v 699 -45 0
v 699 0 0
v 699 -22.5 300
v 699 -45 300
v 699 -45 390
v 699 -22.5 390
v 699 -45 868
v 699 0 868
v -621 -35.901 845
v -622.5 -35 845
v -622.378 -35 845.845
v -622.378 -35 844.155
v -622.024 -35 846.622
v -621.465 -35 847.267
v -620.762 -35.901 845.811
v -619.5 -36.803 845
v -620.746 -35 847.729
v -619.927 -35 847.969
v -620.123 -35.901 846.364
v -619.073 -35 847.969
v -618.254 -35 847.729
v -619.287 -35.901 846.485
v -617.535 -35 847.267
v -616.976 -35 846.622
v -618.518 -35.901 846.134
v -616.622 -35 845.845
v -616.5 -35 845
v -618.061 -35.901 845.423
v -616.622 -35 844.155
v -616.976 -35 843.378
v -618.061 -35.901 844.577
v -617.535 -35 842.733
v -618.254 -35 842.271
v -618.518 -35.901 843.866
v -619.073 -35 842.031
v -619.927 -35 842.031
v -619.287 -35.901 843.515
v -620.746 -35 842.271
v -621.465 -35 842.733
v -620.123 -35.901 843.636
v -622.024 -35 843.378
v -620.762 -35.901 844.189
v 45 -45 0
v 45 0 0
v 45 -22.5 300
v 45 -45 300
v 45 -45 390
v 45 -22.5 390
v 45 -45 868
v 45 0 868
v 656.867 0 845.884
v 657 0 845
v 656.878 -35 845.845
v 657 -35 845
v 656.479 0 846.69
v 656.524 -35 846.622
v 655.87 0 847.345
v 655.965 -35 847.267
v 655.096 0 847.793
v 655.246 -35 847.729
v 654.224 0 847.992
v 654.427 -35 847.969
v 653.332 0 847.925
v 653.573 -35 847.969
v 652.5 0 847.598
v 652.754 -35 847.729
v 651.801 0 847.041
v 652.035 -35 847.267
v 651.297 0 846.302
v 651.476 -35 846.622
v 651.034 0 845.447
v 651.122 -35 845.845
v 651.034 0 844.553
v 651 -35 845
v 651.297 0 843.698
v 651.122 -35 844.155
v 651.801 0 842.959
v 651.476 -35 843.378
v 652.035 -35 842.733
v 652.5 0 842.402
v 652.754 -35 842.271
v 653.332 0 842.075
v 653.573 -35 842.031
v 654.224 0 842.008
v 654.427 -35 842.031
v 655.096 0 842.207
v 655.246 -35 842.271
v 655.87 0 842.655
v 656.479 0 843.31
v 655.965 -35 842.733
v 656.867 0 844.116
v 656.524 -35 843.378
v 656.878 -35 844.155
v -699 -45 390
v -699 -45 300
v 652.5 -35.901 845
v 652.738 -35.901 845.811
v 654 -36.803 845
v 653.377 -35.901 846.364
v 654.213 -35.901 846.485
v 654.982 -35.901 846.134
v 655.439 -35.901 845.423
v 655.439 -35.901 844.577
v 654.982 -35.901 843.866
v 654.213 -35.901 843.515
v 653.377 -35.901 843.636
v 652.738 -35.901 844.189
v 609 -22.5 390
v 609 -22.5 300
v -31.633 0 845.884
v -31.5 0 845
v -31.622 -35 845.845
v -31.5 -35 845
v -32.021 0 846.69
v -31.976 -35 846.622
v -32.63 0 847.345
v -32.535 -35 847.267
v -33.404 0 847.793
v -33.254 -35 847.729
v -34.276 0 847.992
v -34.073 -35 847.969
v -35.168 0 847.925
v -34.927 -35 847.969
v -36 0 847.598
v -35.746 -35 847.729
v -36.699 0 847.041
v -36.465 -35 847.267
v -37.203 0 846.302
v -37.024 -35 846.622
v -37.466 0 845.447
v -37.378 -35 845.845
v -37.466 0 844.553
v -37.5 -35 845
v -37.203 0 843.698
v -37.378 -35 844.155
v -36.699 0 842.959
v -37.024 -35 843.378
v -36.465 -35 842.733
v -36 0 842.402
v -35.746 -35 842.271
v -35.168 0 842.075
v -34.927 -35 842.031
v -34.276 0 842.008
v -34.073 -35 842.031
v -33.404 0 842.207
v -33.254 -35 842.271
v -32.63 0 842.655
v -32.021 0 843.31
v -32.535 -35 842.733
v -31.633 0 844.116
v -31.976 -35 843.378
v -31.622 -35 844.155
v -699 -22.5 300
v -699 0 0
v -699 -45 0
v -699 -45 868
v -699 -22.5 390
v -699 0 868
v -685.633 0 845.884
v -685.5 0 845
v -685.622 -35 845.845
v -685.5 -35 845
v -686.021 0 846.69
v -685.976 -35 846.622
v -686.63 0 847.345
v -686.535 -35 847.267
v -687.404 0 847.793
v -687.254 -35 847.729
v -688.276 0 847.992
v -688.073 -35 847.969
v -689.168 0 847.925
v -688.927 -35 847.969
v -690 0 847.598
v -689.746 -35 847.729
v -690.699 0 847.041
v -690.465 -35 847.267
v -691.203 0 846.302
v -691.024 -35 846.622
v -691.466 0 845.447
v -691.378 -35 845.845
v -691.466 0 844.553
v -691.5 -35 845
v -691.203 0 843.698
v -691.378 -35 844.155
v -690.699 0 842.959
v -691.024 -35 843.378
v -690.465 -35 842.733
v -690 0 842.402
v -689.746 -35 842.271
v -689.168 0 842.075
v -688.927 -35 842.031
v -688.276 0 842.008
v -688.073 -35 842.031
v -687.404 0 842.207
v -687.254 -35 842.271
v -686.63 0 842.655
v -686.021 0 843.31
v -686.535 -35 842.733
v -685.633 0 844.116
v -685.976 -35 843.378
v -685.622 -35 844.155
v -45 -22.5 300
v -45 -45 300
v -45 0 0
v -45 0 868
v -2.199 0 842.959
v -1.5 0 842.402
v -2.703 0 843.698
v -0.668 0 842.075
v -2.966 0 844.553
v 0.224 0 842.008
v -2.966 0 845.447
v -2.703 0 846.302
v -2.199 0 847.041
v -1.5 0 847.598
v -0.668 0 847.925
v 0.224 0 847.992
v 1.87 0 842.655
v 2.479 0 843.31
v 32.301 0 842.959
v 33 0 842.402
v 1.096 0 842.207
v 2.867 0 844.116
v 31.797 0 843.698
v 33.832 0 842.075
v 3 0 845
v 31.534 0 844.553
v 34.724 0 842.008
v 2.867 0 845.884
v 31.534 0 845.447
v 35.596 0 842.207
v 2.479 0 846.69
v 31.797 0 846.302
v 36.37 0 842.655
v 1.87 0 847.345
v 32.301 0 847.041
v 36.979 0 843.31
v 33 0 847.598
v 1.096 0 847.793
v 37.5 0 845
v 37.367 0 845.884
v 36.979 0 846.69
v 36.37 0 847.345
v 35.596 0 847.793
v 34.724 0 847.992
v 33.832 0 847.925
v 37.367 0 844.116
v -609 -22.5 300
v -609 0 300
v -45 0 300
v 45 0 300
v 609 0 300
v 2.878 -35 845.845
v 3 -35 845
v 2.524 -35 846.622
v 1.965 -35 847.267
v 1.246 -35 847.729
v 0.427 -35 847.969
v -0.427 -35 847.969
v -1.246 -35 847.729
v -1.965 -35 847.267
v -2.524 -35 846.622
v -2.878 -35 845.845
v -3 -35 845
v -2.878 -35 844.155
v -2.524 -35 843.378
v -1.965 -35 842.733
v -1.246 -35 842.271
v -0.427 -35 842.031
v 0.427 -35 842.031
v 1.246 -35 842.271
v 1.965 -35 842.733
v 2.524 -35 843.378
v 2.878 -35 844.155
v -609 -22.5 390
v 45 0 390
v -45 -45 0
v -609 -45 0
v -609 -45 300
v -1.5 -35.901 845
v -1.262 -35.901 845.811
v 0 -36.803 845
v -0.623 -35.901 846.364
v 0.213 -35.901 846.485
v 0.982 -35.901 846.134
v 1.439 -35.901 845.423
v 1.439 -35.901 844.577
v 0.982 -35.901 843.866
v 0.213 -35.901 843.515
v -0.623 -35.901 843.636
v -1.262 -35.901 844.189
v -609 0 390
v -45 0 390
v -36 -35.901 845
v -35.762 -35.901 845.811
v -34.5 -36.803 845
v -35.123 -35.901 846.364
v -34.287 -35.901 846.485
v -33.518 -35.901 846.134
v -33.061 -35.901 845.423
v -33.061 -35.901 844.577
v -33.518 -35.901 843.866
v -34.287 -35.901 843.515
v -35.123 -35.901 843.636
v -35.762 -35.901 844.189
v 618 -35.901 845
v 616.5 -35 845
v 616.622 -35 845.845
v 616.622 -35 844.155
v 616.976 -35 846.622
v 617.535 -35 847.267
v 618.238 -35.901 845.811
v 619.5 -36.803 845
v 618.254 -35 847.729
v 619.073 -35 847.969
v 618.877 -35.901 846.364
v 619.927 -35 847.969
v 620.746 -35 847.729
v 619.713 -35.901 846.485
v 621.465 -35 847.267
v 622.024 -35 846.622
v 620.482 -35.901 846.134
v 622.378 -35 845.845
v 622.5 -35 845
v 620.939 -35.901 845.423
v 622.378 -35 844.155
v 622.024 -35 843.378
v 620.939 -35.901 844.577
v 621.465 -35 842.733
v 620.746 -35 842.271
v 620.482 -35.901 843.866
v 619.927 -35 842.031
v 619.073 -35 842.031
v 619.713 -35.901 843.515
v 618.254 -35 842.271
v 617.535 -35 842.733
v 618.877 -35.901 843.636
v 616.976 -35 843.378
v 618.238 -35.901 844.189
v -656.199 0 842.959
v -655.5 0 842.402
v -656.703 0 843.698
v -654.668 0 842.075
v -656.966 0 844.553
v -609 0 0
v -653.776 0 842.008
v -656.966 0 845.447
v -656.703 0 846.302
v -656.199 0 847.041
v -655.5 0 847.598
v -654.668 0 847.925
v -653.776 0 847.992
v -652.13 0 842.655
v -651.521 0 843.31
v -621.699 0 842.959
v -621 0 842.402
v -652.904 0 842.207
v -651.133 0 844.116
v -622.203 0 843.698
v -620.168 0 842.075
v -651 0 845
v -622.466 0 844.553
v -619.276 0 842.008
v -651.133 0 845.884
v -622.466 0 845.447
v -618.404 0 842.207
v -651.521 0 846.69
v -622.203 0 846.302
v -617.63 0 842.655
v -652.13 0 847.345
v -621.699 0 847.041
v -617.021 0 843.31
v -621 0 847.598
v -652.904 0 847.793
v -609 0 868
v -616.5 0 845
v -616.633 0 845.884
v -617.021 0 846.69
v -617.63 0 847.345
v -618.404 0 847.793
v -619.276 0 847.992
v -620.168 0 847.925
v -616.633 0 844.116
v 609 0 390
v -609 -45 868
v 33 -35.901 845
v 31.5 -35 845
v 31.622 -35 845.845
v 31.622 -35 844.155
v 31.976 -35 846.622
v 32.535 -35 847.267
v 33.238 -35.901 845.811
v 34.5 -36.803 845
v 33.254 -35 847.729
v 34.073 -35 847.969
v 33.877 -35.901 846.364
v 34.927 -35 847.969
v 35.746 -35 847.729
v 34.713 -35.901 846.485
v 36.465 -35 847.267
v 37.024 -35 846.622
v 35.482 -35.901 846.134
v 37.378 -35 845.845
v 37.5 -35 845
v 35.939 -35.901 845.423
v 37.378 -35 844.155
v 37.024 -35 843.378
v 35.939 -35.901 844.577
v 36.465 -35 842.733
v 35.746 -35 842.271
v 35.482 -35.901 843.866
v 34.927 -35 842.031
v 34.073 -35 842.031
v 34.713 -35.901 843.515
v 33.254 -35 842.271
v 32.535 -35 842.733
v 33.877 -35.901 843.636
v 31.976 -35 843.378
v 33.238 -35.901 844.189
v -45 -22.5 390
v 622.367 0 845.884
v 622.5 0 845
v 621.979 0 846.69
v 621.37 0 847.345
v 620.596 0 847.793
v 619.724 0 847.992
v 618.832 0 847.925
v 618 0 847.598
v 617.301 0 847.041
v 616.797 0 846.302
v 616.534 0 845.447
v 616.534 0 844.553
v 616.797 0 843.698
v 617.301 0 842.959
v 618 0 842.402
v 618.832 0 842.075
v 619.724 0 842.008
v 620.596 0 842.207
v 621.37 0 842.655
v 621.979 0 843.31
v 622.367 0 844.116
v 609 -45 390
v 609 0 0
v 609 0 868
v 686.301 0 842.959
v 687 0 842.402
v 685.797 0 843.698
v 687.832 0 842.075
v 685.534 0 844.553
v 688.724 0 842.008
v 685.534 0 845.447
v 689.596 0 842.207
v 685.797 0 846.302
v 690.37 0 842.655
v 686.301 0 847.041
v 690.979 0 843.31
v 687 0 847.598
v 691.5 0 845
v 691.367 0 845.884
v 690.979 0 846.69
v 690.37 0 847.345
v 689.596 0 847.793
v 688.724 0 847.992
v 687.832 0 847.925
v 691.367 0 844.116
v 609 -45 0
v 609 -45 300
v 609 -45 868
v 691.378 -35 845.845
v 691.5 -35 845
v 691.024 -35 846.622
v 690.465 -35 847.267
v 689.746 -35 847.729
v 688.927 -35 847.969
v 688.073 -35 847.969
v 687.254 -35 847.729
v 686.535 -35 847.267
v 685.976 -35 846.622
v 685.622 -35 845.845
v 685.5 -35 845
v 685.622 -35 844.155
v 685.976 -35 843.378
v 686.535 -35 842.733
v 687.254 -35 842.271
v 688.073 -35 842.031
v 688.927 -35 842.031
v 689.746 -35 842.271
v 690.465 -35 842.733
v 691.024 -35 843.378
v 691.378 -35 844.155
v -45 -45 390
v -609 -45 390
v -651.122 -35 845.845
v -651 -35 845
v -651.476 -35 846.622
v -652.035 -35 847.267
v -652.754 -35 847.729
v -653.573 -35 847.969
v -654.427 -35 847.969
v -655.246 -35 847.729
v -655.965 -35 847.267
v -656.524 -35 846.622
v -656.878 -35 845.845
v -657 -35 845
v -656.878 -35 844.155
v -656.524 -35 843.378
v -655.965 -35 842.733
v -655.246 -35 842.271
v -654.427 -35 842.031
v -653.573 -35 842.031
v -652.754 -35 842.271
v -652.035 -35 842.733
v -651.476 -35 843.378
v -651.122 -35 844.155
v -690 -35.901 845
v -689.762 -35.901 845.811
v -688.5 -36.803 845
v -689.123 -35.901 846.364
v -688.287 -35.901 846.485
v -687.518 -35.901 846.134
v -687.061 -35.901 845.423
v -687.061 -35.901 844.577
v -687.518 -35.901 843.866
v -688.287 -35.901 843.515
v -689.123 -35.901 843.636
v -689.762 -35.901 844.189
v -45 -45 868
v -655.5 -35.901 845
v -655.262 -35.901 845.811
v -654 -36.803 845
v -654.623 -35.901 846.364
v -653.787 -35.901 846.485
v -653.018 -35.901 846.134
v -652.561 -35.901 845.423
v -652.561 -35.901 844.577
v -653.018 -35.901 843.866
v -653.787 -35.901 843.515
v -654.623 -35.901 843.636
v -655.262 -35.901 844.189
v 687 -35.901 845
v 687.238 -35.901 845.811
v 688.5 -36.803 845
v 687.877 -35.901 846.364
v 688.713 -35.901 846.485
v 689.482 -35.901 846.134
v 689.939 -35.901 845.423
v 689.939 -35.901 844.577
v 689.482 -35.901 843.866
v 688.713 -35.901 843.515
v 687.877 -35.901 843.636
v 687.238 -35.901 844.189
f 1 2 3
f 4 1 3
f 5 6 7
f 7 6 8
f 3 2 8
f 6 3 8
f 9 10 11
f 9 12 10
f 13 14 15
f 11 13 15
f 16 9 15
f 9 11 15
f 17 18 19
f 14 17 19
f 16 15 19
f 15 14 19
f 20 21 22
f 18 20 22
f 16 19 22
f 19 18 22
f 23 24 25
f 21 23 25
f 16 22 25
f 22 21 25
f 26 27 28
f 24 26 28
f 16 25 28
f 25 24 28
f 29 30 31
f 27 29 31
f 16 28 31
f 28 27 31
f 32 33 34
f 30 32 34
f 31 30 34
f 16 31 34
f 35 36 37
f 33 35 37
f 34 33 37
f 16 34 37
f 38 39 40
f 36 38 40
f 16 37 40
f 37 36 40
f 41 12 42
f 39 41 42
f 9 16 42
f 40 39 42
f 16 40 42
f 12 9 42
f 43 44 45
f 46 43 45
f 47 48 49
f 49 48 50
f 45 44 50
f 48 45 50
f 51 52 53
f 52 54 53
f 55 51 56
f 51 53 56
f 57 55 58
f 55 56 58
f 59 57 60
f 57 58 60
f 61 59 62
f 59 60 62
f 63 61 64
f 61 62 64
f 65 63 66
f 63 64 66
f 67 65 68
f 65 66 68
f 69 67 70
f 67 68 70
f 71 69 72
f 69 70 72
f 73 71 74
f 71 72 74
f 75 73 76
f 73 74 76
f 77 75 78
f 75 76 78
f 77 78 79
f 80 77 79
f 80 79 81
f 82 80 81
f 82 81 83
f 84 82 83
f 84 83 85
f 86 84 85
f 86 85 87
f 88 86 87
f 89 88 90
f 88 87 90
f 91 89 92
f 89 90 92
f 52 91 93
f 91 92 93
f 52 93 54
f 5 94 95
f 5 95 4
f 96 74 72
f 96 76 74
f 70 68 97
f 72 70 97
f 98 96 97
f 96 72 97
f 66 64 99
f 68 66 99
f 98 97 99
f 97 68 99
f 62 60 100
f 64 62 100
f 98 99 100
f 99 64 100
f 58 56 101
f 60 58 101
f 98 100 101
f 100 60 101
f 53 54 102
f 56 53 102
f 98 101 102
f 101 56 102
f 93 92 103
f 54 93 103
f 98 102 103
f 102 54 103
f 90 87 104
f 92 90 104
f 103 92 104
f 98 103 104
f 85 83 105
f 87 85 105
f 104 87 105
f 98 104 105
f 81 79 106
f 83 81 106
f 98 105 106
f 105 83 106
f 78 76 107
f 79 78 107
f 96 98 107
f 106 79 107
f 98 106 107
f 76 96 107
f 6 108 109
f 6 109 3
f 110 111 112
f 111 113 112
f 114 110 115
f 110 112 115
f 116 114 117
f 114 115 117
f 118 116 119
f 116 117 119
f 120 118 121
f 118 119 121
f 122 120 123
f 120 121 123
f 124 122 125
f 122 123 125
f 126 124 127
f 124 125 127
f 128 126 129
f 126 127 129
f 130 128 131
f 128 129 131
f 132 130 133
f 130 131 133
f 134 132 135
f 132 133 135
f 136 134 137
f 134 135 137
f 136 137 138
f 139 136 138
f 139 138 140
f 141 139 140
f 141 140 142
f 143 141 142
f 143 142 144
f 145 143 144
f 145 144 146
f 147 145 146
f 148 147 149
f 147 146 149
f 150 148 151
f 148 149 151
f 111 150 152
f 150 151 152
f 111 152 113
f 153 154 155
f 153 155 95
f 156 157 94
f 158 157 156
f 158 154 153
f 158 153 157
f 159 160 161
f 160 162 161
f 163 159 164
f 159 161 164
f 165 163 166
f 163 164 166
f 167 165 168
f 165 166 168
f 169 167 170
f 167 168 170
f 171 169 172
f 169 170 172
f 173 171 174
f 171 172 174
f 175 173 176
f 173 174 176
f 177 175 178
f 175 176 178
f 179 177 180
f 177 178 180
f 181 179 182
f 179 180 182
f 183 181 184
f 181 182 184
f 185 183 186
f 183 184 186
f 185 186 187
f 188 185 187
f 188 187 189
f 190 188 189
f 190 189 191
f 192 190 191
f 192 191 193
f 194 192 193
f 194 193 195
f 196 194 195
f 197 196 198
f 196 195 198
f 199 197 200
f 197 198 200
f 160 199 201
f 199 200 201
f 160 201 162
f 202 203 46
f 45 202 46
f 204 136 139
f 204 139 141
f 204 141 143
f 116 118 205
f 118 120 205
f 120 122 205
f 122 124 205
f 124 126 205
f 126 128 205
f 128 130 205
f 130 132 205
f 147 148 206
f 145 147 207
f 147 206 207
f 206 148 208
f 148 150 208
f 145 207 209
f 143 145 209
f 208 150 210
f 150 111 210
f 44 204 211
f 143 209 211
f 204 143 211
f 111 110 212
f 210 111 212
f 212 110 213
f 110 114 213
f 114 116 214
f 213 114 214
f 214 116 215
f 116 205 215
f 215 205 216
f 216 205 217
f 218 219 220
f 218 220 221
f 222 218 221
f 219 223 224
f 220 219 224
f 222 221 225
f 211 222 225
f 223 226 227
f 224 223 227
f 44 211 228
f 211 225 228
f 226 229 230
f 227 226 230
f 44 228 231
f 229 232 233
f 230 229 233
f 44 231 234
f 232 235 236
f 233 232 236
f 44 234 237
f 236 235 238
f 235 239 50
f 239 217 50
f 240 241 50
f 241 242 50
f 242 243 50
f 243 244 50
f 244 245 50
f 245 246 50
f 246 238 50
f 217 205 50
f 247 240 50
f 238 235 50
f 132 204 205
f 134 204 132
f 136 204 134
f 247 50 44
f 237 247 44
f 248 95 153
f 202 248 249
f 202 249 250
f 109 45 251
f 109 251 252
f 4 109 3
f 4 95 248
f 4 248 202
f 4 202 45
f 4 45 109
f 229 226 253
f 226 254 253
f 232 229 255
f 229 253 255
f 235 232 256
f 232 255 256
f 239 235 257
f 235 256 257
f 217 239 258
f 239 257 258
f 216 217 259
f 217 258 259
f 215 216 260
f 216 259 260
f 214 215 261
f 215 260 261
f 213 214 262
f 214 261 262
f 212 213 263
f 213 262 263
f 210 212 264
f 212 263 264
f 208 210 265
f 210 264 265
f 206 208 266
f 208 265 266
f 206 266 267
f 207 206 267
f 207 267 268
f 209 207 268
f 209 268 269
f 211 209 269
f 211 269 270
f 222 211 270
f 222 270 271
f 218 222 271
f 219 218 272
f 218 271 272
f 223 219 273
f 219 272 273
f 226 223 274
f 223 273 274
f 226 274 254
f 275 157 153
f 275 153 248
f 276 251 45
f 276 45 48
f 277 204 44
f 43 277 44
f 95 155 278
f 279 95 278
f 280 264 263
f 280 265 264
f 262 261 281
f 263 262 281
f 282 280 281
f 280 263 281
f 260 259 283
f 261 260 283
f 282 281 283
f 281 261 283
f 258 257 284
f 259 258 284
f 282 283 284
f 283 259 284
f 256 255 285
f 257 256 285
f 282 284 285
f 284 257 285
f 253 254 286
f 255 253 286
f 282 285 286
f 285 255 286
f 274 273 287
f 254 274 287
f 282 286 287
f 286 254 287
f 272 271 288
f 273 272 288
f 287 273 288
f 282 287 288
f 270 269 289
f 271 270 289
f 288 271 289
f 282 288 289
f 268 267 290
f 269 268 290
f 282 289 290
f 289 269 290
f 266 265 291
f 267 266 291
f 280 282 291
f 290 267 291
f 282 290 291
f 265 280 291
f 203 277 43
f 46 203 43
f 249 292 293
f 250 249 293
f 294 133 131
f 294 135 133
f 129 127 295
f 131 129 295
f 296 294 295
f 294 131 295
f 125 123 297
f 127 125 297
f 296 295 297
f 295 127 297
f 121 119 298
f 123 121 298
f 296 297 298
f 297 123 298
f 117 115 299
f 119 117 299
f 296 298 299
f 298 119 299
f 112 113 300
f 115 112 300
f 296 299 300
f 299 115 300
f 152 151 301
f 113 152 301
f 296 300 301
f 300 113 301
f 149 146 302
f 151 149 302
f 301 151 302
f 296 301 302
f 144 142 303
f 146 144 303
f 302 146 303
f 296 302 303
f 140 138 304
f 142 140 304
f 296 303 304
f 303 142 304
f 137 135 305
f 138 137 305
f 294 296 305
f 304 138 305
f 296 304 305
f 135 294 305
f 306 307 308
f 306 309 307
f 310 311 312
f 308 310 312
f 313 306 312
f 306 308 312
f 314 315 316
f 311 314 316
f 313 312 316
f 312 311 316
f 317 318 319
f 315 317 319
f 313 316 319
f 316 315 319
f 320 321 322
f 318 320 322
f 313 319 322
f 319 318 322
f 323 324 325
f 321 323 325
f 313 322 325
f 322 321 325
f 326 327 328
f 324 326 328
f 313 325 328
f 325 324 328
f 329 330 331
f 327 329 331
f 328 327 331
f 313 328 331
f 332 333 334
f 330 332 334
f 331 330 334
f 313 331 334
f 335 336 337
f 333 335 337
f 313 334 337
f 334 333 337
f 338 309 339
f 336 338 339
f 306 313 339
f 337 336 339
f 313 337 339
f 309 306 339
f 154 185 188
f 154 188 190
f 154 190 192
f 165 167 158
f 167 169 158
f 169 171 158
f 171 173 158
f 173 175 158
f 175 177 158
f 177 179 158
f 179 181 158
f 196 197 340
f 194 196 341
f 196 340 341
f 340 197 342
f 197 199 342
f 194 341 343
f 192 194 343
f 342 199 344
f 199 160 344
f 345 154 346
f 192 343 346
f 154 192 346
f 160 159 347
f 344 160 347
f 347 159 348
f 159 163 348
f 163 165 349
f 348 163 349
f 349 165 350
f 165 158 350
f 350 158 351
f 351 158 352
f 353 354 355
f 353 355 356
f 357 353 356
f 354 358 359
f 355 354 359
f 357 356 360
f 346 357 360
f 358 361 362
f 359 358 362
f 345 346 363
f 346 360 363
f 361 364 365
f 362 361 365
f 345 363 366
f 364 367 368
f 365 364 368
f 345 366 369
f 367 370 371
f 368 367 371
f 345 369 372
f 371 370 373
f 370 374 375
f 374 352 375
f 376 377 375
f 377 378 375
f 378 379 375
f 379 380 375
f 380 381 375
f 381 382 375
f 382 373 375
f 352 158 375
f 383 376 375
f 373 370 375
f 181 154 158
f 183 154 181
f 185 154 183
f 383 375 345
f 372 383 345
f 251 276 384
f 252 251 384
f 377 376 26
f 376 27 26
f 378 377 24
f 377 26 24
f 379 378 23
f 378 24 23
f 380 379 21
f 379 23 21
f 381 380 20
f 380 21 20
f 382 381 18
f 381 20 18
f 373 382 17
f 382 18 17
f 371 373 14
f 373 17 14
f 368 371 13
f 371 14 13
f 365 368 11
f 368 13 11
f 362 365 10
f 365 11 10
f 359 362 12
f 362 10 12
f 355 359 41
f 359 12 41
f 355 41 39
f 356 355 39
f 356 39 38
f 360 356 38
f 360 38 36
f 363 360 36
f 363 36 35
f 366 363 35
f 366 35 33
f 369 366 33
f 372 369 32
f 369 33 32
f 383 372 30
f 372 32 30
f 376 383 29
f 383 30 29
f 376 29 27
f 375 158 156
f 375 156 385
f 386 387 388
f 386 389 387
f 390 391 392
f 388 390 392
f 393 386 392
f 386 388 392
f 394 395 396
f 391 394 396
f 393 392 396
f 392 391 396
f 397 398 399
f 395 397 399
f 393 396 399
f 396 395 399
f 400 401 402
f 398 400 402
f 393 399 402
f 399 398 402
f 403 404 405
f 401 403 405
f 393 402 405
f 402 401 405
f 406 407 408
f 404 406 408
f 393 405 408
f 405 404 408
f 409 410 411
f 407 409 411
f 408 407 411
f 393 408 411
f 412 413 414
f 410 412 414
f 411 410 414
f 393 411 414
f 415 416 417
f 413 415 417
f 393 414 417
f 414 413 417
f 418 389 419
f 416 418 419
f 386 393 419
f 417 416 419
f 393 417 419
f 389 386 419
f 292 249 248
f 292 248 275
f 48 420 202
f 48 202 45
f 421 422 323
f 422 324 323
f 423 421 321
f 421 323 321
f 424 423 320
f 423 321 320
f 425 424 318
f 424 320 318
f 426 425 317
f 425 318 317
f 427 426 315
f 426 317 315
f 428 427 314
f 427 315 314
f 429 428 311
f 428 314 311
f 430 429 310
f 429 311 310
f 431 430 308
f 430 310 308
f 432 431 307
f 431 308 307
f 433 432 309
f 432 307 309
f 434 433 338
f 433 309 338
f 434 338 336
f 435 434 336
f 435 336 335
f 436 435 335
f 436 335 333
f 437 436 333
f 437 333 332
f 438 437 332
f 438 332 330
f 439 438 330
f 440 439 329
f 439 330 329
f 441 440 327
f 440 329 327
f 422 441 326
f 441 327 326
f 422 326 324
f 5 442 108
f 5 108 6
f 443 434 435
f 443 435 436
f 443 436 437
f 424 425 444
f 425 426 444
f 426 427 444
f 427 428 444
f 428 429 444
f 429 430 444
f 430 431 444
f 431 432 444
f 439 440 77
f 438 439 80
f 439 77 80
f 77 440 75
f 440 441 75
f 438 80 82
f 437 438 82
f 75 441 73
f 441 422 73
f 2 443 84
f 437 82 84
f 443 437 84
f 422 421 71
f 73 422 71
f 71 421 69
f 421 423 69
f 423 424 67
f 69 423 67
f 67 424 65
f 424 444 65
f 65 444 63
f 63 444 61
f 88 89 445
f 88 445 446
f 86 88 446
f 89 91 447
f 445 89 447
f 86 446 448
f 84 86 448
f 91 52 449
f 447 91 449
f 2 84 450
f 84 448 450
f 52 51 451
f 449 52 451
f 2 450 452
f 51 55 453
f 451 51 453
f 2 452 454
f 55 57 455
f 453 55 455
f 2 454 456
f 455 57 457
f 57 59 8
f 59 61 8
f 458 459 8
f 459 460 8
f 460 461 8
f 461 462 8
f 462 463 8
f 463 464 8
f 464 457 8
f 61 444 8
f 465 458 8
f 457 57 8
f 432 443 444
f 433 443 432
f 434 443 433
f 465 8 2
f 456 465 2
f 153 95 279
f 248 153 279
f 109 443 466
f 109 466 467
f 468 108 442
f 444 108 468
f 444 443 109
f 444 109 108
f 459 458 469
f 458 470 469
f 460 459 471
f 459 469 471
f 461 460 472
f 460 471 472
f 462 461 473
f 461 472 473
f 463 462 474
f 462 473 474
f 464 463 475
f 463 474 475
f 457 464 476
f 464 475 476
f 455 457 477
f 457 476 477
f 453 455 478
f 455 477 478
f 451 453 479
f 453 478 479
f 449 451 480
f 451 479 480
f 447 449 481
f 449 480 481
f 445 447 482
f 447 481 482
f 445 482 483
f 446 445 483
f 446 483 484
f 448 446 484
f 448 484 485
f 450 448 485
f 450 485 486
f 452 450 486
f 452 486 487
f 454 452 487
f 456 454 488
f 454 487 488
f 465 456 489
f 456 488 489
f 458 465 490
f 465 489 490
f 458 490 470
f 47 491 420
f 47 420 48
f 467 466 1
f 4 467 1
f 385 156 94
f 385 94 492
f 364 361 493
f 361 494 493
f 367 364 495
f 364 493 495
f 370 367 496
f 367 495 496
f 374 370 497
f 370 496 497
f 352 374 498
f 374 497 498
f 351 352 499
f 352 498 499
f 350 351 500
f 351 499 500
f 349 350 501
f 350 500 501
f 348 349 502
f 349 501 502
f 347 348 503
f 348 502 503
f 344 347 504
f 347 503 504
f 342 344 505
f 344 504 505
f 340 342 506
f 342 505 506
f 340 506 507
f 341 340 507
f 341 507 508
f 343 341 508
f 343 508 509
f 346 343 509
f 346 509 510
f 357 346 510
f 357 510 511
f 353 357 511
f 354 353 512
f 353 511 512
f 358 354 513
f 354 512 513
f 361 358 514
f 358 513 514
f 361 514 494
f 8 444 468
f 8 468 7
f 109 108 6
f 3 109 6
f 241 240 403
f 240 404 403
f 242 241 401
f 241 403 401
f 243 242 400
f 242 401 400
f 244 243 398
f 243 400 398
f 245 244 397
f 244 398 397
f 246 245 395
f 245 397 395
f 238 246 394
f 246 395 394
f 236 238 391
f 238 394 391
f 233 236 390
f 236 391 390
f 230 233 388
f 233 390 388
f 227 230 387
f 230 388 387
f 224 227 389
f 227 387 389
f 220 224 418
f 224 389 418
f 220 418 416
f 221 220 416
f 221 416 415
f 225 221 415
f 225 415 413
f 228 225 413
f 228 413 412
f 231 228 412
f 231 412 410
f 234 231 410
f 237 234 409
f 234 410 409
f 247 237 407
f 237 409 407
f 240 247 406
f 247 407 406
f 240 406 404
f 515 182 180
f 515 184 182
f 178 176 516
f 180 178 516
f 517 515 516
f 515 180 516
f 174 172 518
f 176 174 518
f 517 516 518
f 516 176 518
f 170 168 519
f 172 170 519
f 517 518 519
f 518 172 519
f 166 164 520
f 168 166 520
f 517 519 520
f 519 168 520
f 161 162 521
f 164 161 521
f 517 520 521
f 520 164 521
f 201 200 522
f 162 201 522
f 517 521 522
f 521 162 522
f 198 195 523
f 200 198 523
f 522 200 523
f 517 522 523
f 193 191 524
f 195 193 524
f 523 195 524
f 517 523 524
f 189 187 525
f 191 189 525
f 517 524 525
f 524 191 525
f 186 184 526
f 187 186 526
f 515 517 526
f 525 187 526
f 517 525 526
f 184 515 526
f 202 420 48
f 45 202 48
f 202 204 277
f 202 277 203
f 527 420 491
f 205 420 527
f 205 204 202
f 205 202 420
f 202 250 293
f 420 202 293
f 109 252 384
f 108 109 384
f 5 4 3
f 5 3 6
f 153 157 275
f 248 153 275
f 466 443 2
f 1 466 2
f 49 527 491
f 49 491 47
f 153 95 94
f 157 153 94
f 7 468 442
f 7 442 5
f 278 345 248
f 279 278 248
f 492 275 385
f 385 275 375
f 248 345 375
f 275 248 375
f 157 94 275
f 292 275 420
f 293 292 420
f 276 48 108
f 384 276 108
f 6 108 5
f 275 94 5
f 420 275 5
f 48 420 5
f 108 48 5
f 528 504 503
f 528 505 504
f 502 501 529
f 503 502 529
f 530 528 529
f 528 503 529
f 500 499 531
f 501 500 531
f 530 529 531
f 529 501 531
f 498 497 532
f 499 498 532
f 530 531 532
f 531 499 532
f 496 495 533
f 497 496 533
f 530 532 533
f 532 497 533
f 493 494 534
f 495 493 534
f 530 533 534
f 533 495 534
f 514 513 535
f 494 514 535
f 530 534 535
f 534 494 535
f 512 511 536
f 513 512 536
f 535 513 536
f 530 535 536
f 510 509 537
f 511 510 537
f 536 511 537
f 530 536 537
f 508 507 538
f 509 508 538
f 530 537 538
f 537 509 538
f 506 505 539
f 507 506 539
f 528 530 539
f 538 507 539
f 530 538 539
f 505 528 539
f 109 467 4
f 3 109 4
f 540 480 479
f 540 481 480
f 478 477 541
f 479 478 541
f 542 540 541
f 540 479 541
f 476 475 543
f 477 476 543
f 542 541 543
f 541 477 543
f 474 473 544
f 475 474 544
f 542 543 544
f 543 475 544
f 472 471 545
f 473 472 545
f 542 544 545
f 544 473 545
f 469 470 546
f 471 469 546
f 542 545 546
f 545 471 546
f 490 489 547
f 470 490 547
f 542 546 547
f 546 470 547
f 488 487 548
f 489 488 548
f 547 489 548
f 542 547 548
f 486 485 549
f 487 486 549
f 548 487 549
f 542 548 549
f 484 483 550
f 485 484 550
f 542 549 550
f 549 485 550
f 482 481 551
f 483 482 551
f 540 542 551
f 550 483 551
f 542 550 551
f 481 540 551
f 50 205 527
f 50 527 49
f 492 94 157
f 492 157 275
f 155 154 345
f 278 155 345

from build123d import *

# Parameters (mm, degrees)
F0_W       = 90
F0_H       = 868
F1_DEPTH   = 45
F2_W       = 1398
F2_H       = 90
F3_DEPTH   = 22.5
F4_W       = 1398
F4_H       = 90
F5_DEPTH   = 45
F8_D       = 6
F8_DEPTH   = 35
F8_TIP     = 1.8025818571
F8_2_D     = 6
F8_2_DEPTH = 35
F8_2_TIP   = 1.8025818571
F8_3_D     = 6
F8_3_DEPTH = 35
F8_3_TIP   = 1.8025818571


with BuildPart() as f1:
    # F0 (on Front) → F1 (new body)
    with BuildSketch(Plane.XZ):
        with Locations((-654, 434)):
            Rectangle(F0_W, F0_H)
    extrude(amount=F1_DEPTH)


with BuildPart() as f1b:
    # F0 (on Front) → F1, piece 2 (new body)
    with BuildSketch(Plane.XZ):
        with Locations((0, 434)):
            Rectangle(F0_W, F0_H)
    extrude(amount=F1_DEPTH)


with BuildPart() as f1c:
    # F0 (on Front) → F1, piece 3 (new body)
    with BuildSketch(Plane.XZ):
        with Locations((654, 434)):
            Rectangle(F0_W, F0_H)
    extrude(amount=F1_DEPTH)


with BuildPart() as f3_tool:
    # F2 (on face) → F3 (new body)
    with BuildSketch(Plane.XZ.offset(45)):
        with Locations((0, 345)):
            Rectangle(F2_W, F2_H)
    extrude(amount=-F3_DEPTH)


with BuildPart() as f1_1:
    add(f1.part)

    # F3: cut by f3_tool
    add(f3_tool.part, mode=Mode.SUBTRACT)


with BuildPart() as f1b_1:
    add(f1b.part)

    # F3: cut by f3_tool
    add(f3_tool.part, mode=Mode.SUBTRACT)


with BuildPart() as f1c_1:
    add(f1c.part)

    # F3: cut by f3_tool
    add(f3_tool.part, mode=Mode.SUBTRACT)


with BuildPart() as f5:
    # F4 (on face) → F5 (new body)
    with BuildSketch(Plane.XZ.offset(45)):
        with Locations((0, 345)):
            Rectangle(F4_W, F4_H)
    extrude(amount=-F5_DEPTH)

    # F6: cut F1, F1b, F1c
    add(f1_1.part, mode=Mode.SUBTRACT)
    add(f1b_1.part, mode=Mode.SUBTRACT)
    add(f1c_1.part, mode=Mode.SUBTRACT)


with BuildPart() as f1_2:
    add(f1_1.part)

    # F8
    with Locations(Plane(origin=(0, 0, 0), x_dir=(-1, 0, 0), z_dir=(0, 1, 0))):
        with Locations((-688.5, 845), (-654, 845), (-619.5, 845), (-34.5, 845), (0, 845), (34.5, 845), (619.5, 845), (654, 845), (688.5, 845)):
            Hole(F8_D / 2, depth=F8_DEPTH)
            with Locations((0, 0, -(F8_DEPTH + F8_TIP / 2))):  # 118° drill point
                Cone(0, F8_D / 2, F8_TIP, mode=Mode.SUBTRACT)


with BuildPart() as f1b_2:
    add(f1b_1.part)

    # F8#2
    with Locations(Plane(origin=(0, 0, 0), x_dir=(-1, 0, 0), z_dir=(0, 1, 0))):
        with Locations((-688.5, 845), (-654, 845), (-619.5, 845), (-34.5, 845), (0, 845), (34.5, 845), (619.5, 845), (654, 845), (688.5, 845)):
            Hole(F8_2_D / 2, depth=F8_2_DEPTH)
            with Locations((0, 0, -(F8_2_DEPTH + F8_2_TIP / 2))):  # 118° drill point
                Cone(0, F8_2_D / 2, F8_2_TIP, mode=Mode.SUBTRACT)


with BuildPart() as f1c_2:
    add(f1c_1.part)

    # F8#3
    with Locations(Plane(origin=(0, 0, 0), x_dir=(-1, 0, 0), z_dir=(0, 1, 0))):
        with Locations((-688.5, 845), (-654, 845), (-619.5, 845), (-34.5, 845), (0, 845), (34.5, 845), (619.5, 845), (654, 845), (688.5, 845)):
            Hole(F8_3_D / 2, depth=F8_3_DEPTH)
            with Locations((0, 0, -(F8_3_DEPTH + F8_3_TIP / 2))):  # 118° drill point
                Cone(0, F8_3_D / 2, F8_3_TIP, mode=Mode.SUBTRACT)


solid = Compound([f5.part, f1_2.part, f1b_2.part, f1c_2.part])
